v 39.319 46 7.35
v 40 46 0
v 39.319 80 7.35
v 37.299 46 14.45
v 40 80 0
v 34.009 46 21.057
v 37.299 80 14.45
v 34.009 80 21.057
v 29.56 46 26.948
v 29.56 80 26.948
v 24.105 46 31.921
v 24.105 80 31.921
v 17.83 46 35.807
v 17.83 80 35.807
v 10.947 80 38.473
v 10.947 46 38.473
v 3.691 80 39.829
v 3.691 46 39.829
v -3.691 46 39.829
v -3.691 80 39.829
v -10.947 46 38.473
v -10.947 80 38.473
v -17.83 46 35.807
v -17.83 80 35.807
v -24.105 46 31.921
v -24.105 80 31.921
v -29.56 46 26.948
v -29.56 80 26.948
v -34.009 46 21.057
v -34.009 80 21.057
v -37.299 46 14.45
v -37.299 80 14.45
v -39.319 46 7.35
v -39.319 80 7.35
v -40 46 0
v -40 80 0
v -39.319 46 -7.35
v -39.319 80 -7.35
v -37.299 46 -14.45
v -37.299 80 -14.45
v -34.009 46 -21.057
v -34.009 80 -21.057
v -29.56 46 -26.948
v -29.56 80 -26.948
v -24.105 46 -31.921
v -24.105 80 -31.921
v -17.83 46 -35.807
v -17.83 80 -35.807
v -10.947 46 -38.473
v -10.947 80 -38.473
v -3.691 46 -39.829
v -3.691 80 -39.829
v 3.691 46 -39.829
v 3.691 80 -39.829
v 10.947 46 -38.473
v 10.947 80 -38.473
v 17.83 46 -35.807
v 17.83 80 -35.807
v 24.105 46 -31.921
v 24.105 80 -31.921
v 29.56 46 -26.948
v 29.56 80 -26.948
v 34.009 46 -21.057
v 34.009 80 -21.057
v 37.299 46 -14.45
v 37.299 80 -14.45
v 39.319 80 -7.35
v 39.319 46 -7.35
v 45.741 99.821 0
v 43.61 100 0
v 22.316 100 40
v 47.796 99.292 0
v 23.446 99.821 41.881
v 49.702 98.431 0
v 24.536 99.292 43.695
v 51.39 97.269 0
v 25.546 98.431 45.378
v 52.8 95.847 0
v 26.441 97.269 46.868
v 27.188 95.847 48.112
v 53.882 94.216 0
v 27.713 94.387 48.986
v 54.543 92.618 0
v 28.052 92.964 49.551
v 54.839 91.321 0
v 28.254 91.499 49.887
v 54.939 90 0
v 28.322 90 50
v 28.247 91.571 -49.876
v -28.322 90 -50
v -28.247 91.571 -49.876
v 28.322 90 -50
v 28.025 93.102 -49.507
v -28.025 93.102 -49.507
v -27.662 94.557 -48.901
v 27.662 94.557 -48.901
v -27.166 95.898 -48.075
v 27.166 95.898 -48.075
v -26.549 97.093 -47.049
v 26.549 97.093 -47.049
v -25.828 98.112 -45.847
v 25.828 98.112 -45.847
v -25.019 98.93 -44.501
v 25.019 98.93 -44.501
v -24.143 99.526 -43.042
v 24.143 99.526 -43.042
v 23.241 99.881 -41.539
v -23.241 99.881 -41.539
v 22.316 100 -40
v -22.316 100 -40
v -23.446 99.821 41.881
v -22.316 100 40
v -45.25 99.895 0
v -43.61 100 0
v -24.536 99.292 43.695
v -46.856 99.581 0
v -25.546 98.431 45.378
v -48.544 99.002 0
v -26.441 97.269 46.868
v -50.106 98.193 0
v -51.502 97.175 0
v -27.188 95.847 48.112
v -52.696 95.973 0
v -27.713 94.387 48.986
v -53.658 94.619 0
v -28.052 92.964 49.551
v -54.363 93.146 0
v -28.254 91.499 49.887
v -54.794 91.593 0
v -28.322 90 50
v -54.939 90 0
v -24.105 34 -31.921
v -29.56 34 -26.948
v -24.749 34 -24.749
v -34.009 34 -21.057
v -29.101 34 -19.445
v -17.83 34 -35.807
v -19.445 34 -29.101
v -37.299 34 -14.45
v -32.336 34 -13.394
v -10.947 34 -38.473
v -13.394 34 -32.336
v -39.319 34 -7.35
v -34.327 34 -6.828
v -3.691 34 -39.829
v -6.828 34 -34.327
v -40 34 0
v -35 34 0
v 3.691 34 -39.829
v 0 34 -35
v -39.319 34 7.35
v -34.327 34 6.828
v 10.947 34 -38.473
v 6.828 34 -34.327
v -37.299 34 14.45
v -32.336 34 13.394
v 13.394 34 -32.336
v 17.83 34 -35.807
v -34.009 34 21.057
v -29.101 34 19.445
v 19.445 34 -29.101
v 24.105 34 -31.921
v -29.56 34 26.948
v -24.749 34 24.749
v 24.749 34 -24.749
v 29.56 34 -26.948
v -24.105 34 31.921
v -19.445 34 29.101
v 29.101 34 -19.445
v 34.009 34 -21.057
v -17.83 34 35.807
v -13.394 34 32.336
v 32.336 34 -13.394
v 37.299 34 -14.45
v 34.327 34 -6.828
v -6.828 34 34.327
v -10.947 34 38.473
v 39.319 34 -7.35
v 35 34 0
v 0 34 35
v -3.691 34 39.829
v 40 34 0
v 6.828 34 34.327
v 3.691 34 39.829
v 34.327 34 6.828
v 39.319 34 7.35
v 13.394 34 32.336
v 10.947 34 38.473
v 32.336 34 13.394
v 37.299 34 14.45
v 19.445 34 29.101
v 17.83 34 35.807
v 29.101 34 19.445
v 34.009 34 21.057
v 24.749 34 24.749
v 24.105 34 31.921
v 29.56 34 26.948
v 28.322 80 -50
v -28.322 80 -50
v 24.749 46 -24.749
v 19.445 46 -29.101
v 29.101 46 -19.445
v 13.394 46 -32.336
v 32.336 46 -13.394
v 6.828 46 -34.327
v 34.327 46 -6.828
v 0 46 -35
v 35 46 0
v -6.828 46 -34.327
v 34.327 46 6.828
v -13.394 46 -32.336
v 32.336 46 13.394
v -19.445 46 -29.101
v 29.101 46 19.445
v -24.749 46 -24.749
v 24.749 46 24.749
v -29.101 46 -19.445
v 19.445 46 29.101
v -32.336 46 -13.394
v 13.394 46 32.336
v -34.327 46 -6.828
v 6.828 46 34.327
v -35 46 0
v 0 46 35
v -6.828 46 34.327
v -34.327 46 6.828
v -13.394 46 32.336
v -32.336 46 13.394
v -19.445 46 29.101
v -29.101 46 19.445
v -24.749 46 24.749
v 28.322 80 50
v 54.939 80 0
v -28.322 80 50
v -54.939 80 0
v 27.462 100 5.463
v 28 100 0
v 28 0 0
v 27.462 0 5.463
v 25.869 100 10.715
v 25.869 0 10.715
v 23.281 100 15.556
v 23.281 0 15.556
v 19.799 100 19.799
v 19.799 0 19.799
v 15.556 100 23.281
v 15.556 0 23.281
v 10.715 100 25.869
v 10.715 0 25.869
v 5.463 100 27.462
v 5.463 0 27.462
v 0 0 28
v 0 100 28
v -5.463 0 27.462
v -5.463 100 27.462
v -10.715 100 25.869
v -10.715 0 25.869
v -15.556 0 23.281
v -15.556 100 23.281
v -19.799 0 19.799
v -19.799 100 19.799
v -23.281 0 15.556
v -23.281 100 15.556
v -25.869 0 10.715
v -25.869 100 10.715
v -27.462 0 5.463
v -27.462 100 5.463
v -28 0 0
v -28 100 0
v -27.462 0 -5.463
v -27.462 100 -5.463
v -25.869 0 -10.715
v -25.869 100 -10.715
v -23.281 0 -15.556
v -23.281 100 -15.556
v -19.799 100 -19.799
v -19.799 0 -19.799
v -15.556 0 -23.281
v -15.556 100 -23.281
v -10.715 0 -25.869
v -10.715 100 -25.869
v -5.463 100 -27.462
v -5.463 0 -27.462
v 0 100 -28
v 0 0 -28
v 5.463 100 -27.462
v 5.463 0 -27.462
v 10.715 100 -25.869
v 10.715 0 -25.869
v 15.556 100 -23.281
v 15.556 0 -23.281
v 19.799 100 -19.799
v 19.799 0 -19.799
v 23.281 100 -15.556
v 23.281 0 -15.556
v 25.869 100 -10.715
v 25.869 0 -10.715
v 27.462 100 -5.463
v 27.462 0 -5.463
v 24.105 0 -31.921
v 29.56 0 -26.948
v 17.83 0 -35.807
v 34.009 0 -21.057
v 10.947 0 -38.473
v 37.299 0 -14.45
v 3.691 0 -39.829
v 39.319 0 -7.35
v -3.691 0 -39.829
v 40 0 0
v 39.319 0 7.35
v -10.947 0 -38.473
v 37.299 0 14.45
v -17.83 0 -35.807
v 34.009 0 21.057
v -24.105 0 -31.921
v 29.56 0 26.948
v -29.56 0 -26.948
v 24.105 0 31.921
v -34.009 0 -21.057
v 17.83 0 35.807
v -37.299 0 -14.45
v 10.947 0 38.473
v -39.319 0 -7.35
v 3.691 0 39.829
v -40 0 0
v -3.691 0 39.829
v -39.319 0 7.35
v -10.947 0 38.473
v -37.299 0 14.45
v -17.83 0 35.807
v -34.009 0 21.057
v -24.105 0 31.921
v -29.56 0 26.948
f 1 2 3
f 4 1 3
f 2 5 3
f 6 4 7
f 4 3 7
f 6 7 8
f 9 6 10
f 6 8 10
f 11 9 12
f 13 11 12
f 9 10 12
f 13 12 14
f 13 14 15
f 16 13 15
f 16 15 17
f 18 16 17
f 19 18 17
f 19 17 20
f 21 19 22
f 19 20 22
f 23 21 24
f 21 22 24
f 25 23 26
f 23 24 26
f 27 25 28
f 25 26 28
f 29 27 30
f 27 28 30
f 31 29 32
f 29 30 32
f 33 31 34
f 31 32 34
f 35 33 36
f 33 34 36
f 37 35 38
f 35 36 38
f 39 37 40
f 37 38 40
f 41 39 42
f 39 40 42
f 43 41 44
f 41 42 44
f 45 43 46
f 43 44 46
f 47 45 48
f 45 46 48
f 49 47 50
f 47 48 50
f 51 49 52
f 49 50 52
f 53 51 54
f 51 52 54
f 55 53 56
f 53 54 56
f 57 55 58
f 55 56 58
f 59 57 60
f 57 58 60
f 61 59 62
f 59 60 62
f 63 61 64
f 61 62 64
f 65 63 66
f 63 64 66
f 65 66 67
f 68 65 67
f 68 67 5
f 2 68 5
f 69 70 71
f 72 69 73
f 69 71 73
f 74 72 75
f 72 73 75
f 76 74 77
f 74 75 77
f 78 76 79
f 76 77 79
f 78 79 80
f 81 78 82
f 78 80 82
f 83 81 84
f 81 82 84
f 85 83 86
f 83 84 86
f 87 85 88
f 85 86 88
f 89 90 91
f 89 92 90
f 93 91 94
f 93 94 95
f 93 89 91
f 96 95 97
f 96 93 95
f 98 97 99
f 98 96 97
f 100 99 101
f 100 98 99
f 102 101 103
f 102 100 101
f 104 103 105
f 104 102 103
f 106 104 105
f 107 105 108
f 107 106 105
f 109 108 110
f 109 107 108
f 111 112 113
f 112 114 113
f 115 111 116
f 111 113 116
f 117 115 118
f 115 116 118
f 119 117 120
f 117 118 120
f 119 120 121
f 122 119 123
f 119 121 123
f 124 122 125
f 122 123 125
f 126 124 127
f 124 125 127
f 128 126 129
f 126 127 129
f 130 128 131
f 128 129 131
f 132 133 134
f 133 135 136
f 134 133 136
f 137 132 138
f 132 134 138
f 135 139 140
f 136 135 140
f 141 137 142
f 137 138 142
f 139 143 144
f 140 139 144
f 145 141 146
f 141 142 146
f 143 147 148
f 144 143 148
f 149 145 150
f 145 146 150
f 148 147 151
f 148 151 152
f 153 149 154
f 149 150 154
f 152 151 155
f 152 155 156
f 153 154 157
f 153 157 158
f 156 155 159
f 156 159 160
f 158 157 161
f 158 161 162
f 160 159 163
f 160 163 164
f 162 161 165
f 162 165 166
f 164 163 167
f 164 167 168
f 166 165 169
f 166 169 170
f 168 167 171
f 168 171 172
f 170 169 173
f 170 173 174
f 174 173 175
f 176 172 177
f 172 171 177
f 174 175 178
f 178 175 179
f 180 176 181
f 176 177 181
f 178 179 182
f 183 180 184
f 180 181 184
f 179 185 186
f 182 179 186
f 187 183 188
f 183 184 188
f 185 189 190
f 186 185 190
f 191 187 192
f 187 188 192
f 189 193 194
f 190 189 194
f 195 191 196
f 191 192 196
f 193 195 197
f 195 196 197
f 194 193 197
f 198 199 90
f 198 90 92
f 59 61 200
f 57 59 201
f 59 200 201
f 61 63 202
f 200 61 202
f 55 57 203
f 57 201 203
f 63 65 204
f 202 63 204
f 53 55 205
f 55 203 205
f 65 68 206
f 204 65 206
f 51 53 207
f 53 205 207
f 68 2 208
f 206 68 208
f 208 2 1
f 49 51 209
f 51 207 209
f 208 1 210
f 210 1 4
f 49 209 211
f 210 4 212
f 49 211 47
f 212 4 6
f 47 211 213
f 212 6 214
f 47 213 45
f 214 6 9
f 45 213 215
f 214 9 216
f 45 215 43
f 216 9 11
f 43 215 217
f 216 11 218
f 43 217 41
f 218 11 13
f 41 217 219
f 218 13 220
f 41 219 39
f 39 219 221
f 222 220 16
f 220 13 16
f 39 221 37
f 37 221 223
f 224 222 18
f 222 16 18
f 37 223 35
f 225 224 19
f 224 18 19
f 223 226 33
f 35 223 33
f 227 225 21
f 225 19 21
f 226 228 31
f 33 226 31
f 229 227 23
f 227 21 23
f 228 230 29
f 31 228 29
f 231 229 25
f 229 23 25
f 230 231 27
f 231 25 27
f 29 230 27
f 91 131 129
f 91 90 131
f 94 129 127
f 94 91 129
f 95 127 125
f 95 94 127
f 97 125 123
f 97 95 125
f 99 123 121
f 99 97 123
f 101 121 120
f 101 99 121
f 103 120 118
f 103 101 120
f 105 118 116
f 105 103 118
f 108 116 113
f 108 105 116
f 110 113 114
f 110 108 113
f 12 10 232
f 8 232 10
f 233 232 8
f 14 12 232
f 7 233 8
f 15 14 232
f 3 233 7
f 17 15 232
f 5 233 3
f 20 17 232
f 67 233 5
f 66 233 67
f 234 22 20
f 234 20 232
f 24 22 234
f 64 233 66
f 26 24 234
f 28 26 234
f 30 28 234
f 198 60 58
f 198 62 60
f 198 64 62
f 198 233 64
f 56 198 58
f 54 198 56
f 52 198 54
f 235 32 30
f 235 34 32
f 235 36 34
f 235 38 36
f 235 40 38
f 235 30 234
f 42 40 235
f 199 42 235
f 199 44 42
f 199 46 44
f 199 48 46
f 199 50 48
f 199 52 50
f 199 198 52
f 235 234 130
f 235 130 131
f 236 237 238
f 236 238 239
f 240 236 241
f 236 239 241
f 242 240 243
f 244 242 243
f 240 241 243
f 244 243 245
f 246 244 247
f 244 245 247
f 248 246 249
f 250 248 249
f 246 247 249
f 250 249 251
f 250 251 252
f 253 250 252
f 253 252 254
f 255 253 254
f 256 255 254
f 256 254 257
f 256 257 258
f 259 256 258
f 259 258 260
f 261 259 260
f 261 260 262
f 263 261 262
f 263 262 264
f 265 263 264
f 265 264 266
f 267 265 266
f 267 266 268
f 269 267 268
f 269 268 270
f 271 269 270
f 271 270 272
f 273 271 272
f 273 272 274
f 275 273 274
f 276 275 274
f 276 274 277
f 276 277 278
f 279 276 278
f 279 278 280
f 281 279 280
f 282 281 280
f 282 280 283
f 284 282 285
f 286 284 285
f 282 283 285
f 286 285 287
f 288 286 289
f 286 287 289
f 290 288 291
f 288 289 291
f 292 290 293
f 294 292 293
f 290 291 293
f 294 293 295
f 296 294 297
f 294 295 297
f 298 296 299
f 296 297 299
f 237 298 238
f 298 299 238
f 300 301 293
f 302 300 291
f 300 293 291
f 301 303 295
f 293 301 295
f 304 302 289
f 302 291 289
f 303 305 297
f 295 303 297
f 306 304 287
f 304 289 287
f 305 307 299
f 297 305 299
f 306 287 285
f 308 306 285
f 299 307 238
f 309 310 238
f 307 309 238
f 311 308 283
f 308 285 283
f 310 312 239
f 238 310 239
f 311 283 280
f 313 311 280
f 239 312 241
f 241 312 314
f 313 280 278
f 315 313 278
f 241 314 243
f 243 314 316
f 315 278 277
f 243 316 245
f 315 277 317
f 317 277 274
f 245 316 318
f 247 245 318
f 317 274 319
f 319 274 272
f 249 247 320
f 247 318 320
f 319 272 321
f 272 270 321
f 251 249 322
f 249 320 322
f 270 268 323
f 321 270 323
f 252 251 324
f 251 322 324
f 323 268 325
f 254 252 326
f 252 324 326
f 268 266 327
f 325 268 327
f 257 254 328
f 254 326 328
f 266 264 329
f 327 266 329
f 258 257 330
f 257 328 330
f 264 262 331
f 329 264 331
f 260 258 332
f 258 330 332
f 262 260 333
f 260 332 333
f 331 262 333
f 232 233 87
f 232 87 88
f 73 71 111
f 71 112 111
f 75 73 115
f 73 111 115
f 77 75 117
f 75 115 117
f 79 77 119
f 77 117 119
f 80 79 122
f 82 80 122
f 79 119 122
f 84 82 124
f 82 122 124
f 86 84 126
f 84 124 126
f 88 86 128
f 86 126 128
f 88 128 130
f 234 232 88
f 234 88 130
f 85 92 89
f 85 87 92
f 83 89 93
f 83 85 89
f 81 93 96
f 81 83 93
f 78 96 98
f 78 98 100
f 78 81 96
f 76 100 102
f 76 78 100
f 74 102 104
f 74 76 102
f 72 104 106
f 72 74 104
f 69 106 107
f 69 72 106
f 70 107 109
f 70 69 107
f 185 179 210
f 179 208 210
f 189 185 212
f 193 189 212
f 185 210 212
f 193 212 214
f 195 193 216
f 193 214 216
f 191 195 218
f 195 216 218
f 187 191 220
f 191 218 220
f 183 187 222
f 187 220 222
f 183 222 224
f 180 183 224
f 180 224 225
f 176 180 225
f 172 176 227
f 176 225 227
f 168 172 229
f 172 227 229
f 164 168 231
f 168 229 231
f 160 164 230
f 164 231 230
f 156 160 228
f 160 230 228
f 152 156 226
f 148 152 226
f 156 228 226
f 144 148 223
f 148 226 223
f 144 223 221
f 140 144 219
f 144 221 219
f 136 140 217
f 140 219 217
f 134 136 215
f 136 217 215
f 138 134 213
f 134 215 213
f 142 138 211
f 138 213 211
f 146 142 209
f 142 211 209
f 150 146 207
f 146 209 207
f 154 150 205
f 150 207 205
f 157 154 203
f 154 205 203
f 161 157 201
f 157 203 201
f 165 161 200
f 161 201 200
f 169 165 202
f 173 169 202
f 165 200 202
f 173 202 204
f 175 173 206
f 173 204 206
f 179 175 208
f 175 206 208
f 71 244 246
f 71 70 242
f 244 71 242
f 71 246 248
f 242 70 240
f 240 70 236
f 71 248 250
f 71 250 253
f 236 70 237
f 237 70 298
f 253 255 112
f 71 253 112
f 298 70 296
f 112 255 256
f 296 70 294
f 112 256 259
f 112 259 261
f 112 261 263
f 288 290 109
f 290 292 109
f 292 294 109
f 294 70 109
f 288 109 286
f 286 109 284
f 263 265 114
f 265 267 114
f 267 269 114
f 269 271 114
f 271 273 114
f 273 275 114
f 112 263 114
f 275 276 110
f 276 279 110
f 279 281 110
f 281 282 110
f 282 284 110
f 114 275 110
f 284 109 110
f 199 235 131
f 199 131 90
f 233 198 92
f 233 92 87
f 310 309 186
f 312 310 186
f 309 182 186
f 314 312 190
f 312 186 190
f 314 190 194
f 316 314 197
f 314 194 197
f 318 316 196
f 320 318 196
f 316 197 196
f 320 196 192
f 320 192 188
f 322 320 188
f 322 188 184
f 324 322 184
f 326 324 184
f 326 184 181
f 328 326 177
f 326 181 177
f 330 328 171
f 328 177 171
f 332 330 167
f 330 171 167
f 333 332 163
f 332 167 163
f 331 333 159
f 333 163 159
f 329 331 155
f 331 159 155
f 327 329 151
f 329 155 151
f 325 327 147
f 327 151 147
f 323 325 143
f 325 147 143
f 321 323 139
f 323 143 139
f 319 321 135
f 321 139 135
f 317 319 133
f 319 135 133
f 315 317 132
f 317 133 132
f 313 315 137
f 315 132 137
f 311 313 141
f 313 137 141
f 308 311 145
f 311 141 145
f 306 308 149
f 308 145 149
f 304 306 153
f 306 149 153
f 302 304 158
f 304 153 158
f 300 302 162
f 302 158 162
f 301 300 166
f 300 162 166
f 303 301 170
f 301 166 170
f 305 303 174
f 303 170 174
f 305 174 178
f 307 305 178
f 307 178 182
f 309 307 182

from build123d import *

# Parameters (mm, degrees)
BOSS_EXTRUDE1_DEPTH = 20
FILLET1_R           = 10
CUT_EXTRUDE1_REACH  = 102
SKETCH5_R           = 28


with BuildPart() as part:
    # Sketch1 → Revolve1 (revolve)
    with BuildSketch(Plane.XY):
        Polygon((0, 0), (40, 0), (40, 34), (35, 34), (35, 46), (40, 46), (40, 80), (0, 80), align=None)
    revolve(axis=Axis((0, 103.412132622, 0), (0, -1, 0)))

    # Sketch2 → Boss-Extrude1 (add)
    with BuildSketch(Plane(origin=(0, 80, 0), x_dir=(1, 0, 0), z_dir=(0, 1, 0))):
        Polygon((-28.321671813, 50), (28.321671813, 50), (54.938741093, 0), (28.321671813, -50), (-28.321671813, -50), (-54.938741093, 0), align=None)
    extrude(amount=BOSS_EXTRUDE1_DEPTH)

    # Fillet1
    fillet1_edges = [part.edges().sort_by_distance(p)[0] for p in [
        (-41.630206453, 100, -25),
        (-41.630206453, 100, 25),
        (0, 100, 50),
        (41.630206453, 100, 25),
        (41.630206453, 100, -25),
        (0, 100, -50),
    ]]
    fillet(fillet1_edges, radius=FILLET1_R)

    # Sketch5 → Cut-Extrude1 (cut, up to next)
    with BuildSketch(Plane.XZ, mode=Mode.PRIVATE) as cut_extrude1_sk1:
        Circle(SKETCH5_R)
    cut_extrude1_tool1 = extrude(cut_extrude1_sk1.sketch, amount=-CUT_EXTRUDE1_REACH, mode=Mode.PRIVATE) & part.part
    add(cut_extrude1_tool1.solids().sort_by_distance((0, 0, 0))[0], mode=Mode.SUBTRACT)


solid = part.part
